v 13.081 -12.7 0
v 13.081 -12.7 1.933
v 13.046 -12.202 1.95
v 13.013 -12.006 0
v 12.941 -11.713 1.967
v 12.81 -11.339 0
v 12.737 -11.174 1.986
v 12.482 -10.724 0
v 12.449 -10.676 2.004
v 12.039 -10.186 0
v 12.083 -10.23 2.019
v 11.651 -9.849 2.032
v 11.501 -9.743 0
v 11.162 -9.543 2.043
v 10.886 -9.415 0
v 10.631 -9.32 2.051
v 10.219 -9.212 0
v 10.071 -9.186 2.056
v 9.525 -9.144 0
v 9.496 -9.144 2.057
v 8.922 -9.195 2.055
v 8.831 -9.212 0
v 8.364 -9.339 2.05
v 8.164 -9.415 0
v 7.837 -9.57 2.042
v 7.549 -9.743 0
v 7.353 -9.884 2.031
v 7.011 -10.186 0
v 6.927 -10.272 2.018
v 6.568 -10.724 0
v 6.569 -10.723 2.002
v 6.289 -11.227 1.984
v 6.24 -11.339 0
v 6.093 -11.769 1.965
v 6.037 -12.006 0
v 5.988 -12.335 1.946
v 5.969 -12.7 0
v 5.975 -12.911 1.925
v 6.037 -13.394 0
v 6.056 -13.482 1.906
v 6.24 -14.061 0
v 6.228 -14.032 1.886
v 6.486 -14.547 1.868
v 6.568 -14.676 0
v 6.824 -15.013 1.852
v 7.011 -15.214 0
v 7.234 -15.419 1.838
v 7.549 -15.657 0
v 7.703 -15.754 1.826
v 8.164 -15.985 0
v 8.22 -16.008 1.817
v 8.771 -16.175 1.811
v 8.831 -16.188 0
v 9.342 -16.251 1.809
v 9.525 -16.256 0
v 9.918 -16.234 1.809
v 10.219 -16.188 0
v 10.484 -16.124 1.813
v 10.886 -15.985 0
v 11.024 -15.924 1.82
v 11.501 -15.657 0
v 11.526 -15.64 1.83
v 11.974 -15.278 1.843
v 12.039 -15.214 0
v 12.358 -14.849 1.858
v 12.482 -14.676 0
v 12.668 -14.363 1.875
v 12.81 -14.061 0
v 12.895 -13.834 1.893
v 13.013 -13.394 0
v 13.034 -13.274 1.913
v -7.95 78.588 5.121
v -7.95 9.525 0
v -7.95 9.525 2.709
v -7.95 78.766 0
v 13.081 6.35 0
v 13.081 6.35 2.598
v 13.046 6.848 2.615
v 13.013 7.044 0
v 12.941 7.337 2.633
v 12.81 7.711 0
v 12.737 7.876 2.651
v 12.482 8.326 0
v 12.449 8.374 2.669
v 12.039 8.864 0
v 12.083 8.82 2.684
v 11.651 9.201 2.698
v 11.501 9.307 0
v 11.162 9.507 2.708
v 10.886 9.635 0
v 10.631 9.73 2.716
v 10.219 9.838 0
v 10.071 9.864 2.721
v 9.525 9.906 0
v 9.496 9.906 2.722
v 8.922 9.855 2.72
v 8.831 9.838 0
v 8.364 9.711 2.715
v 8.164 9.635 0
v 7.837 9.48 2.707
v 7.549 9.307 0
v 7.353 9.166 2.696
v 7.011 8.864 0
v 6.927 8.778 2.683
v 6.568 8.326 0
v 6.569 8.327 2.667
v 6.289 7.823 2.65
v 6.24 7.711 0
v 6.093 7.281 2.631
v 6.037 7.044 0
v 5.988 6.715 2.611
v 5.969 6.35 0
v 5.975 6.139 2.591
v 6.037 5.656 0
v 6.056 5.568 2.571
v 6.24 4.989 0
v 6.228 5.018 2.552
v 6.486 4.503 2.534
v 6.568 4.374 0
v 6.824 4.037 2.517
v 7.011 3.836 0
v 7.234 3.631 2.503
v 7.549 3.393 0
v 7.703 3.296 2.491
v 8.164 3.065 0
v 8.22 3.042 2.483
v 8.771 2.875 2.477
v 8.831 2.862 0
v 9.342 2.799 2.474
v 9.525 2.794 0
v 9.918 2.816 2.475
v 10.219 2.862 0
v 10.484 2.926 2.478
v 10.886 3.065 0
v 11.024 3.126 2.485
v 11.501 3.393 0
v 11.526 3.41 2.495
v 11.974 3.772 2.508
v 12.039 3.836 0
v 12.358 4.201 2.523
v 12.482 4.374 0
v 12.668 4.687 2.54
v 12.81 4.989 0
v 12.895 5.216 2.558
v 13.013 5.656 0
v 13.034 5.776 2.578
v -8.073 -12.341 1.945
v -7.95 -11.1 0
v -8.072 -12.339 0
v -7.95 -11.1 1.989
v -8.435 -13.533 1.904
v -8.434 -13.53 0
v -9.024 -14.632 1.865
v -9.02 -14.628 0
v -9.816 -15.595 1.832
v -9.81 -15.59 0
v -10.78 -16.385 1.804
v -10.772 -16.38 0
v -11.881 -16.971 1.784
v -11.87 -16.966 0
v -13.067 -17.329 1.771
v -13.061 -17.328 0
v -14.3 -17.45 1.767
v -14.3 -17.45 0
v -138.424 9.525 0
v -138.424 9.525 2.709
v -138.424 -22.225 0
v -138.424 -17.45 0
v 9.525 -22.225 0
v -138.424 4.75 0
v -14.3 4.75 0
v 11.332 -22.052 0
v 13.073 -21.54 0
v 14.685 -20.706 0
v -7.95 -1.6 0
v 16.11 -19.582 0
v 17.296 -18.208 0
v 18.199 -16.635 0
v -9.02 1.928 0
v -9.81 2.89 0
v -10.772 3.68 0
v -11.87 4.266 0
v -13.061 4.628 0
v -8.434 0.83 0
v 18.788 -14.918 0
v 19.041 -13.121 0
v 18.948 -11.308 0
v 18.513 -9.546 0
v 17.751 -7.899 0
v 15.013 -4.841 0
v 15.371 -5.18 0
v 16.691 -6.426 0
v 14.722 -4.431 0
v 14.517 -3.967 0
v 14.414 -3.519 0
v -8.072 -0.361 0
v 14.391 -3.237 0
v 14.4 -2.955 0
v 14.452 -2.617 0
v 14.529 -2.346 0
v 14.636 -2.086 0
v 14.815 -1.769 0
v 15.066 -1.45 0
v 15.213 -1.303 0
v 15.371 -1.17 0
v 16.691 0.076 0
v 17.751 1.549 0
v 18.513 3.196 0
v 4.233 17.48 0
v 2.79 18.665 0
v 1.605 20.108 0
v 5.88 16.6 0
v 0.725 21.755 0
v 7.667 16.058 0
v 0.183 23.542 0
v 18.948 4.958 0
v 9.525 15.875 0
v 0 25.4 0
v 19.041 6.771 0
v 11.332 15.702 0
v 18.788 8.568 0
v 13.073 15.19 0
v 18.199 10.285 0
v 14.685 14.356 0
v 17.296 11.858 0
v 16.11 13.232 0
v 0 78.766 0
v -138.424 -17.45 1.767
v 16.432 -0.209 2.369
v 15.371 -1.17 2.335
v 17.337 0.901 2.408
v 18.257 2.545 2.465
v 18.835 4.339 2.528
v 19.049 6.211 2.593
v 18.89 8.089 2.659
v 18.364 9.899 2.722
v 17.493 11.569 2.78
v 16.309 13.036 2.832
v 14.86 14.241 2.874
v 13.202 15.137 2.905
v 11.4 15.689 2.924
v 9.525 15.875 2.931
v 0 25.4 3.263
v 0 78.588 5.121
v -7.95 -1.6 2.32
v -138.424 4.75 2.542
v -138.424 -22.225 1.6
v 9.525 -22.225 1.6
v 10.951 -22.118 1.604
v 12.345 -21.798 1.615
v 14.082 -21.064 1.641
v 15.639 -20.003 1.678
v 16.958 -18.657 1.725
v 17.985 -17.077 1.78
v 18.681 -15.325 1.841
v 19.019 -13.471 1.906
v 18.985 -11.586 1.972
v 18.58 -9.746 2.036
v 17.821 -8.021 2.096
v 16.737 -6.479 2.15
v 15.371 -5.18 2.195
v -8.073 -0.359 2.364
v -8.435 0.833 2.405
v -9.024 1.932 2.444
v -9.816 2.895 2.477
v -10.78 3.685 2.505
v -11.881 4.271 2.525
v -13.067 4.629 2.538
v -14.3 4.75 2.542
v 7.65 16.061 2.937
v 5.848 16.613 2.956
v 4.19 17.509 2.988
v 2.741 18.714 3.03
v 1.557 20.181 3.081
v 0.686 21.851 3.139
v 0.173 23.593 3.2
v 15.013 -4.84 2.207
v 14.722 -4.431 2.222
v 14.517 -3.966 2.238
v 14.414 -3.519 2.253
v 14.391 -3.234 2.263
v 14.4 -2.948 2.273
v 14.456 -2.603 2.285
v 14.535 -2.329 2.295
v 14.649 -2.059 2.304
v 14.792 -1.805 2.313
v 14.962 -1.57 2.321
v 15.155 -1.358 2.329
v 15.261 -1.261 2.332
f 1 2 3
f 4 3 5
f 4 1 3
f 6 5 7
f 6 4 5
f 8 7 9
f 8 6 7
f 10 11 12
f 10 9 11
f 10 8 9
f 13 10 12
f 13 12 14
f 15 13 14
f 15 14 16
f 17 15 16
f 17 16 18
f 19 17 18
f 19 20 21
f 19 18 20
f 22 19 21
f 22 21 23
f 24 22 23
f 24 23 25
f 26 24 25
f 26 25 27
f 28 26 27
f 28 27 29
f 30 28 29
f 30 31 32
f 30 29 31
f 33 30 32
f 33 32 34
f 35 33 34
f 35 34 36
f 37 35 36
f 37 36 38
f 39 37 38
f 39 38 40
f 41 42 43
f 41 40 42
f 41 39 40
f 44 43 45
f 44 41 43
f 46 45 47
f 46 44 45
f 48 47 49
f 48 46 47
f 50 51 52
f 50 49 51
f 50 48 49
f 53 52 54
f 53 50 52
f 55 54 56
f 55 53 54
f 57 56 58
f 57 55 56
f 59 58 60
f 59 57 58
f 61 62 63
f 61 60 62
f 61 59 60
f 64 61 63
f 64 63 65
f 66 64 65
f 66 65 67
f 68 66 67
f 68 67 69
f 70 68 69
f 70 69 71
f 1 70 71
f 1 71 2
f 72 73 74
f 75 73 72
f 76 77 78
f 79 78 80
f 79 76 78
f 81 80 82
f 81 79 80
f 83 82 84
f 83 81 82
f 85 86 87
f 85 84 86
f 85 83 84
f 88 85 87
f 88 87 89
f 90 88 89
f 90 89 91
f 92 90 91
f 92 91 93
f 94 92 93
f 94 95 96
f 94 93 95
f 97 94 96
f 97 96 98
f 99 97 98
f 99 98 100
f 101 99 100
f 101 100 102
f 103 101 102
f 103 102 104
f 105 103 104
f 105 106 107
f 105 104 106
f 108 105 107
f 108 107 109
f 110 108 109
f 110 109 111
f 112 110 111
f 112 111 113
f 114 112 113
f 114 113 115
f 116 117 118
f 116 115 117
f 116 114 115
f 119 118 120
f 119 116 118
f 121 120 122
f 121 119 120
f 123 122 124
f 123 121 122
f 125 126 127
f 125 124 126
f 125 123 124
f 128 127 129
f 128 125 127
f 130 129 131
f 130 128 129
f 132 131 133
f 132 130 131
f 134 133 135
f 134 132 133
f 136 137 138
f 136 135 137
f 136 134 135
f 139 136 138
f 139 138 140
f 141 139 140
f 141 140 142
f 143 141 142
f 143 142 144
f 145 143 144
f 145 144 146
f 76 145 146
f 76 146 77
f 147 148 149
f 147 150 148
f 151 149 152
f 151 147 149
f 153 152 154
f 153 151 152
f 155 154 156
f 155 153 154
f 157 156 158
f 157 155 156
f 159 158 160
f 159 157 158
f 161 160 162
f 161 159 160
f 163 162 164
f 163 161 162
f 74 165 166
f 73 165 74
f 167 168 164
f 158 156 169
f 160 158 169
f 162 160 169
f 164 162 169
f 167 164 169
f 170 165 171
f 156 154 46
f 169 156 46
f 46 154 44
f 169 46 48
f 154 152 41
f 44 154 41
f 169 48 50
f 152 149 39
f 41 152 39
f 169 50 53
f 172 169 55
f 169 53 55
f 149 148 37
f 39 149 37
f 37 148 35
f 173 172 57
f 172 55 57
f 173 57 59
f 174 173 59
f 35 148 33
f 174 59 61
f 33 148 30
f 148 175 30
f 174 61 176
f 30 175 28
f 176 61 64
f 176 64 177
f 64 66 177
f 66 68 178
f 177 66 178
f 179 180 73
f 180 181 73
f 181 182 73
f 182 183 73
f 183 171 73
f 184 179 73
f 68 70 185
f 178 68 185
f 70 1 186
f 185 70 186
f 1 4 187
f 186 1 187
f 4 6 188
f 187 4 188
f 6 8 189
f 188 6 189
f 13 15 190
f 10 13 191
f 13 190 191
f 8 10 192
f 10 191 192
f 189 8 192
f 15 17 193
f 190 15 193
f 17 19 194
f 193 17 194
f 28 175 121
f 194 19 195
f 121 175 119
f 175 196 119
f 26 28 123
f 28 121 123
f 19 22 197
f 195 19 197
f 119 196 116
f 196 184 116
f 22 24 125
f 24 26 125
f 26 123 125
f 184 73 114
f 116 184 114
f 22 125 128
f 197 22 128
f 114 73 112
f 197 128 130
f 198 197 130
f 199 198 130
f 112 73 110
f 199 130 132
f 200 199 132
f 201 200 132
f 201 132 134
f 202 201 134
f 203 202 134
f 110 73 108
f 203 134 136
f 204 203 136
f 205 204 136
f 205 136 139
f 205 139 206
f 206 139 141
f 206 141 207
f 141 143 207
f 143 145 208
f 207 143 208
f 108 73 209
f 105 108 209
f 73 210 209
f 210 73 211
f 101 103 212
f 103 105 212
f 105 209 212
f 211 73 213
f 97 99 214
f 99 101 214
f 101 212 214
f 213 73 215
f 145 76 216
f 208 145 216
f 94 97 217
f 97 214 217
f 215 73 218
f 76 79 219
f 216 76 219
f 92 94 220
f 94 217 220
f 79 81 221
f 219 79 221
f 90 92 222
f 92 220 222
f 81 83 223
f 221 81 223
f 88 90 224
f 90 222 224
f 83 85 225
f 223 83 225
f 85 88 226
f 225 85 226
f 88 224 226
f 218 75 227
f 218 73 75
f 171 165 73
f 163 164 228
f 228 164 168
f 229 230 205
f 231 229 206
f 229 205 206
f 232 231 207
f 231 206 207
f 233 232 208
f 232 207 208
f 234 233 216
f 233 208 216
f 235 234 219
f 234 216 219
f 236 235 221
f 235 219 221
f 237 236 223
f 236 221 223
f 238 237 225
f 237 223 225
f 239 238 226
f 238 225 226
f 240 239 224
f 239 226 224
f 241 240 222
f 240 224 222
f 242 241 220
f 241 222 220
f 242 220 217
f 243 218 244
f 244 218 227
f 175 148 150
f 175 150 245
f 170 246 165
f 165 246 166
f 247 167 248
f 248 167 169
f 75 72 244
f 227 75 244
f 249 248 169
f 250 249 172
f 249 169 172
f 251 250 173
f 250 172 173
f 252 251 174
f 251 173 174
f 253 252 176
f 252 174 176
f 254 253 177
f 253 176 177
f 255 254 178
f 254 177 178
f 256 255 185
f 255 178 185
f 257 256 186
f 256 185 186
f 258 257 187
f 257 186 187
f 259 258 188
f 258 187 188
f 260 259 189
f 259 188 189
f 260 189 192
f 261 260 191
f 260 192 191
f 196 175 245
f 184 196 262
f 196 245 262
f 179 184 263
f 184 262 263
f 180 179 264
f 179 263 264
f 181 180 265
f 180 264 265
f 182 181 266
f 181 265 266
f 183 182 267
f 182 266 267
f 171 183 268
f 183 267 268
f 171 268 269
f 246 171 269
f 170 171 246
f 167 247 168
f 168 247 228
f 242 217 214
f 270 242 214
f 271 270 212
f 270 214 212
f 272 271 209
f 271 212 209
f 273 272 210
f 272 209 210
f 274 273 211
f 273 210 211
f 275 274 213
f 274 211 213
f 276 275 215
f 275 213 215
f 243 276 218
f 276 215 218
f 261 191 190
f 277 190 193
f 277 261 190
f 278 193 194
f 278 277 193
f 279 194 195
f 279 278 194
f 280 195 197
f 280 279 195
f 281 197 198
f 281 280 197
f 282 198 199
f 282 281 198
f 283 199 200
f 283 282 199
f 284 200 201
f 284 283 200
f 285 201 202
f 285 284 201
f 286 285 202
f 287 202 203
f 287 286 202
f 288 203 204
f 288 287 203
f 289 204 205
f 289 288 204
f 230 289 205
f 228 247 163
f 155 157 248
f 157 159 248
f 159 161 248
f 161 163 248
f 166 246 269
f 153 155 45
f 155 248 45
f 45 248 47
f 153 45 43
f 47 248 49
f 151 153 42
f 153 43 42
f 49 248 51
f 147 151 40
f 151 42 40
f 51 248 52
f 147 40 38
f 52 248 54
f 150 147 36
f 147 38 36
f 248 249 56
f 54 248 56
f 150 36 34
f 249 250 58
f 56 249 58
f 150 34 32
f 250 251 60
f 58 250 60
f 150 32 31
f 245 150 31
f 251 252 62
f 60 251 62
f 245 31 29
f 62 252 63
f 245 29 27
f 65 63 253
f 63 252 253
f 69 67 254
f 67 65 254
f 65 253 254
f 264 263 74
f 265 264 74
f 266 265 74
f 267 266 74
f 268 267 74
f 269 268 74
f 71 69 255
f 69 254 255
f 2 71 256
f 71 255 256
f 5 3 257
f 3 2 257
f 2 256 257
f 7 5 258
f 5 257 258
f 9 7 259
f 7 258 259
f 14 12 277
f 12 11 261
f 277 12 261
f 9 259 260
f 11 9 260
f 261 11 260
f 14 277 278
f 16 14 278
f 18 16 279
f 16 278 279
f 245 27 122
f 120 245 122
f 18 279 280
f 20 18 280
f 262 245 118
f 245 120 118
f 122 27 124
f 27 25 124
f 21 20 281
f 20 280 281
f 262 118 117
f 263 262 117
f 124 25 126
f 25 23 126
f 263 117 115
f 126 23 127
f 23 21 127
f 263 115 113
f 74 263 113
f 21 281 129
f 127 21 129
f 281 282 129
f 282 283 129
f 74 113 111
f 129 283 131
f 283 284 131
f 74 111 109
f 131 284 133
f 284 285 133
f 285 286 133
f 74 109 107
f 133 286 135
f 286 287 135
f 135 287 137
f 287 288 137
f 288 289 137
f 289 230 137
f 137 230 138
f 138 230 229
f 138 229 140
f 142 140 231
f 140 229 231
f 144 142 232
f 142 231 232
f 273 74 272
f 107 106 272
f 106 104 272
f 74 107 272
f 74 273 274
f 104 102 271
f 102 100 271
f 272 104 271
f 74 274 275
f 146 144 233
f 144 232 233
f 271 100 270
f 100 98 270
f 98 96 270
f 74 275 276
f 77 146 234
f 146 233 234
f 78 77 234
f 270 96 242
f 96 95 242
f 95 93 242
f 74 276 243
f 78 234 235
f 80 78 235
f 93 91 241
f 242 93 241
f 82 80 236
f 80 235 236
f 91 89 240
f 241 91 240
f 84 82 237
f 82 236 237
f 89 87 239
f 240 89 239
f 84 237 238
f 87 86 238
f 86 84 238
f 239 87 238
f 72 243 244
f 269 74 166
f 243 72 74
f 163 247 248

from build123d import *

# Parameters (mm, degrees)
BOSS_EXTRUDE1_OUTLINE_R = 3.556
BOSS_EXTRUDE1_OUTLINE_W = 260.9469
BOSS_EXTRUDE1_OUTLINE_H = 138.1252
BOSS_EXTRUDE1_DEPTH     = 76.2
CUT_EXTRUDE1_DEPTH      = 355.32482824
CUT_EXTRUDE1_DEPTH_BACK = 355.32482824
FILLET1_R               = 2.54
SKETCH7_W               = 260.9469
SKETCH7_H               = 22.1996
CUT_EXTRUDE2_DEPTH      = 347.152897849
FILLET2_R               = 6.35
SKETCH8_W               = 190.775627824
SKETCH8_H               = 235.521960295
CUT_EXTRUDE4_DEPTH      = 347.144751077
SKETCH9_W               = 166.035784577
SKETCH9_H               = 113.418104201
CUT_EXTRUDE5_DEPTH      = 227.747805823


# Read off the part's stored shape, not the designer's step: Boss-Extrude1
with BuildPart() as part:
    # Boss-Extrude1 outline → Boss-Extrude1 (new body)
    with BuildSketch(Plane.XY):
        with BuildLine():
            Line((-286.3596, -22.225), (9.525, -22.225))
            ThreePointArc((9.525, -22.225), (19.05, -12.7), (9.525, -3.175))
            ThreePointArc((9.525, -3.175), (19.05, 6.35), (9.525, 15.875))
            ThreePointArc((9.525, 15.875), (2.789807909, 18.664807909), (0, 25.4))
            Line((0, 25.4), (0, 131.7752))
            ThreePointArc((0, 131.7752), (2.789807909, 138.510392091), (9.525, 141.3002))
            ThreePointArc((9.525, 141.3002), (19.05, 150.8252), (9.525, 160.3502))
            ThreePointArc((9.525, 160.3502), (19.05, 169.8752), (9.525, 179.4002))
            Line((9.525, 179.4002), (-6.35, 179.4002))
            Line((-6.35, 179.4002), (-6.35, 163.5252))
            Line((-6.35, 163.5252), (-7.9502, 163.5252))
            Line((-7.9502, 163.5252), (-7.9502, 160.3502))
            Line((-7.9502, 160.3502), (-268.9098, 160.3502))
            Line((-268.9098, 160.3502), (-268.9098, 163.5252))
            Line((-268.9098, 163.5252), (-270.51, 163.5252))
            Line((-270.51, 163.5252), (-270.51, 179.4002))
            Line((-270.51, 179.4002), (-286.385, 179.4002))
            ThreePointArc((-286.385, 179.4002), (-295.91, 169.8752), (-286.385, 160.3502))
            ThreePointArc((-286.385, 160.3502), (-295.897297883, 150.818850004), (-286.3723, 141.3002))
            ThreePointArc((-286.3723, 141.3002), (-279.637107909, 138.510392091), (-276.8473, 131.7752))
            Line((-276.8473, 131.7752), (-276.8473, 25.4))
            ThreePointArc((-276.8473, 25.4), (-279.637107909, 18.664807909), (-286.3723, 15.875))
            ThreePointArc((-286.3723, 15.875), (-295.8973, 6.35), (-286.3723, -3.175))
            ThreePointArc((-286.3723, -3.175), (-295.884597883, -12.706349996), (-286.3596, -22.225))
        make_face()
        with Locations((-286.3596, -12.7)):
            Circle(BOSS_EXTRUDE1_OUTLINE_R, mode=Mode.SUBTRACT)
        with Locations((-286.3723, 6.35)):
            Circle(BOSS_EXTRUDE1_OUTLINE_R, mode=Mode.SUBTRACT)
        with Locations((9.525, -12.7)):
            Circle(BOSS_EXTRUDE1_OUTLINE_R, mode=Mode.SUBTRACT)
        with Locations((9.525, 6.35)):
            Circle(BOSS_EXTRUDE1_OUTLINE_R, mode=Mode.SUBTRACT)
        with Locations((-286.3723, 150.8252)):
            Circle(BOSS_EXTRUDE1_OUTLINE_R, mode=Mode.SUBTRACT)
        with Locations((-286.385, 169.8752)):
            Circle(BOSS_EXTRUDE1_OUTLINE_R, mode=Mode.SUBTRACT)
        with Locations((-138.42365, 78.5876)):
            Rectangle(BOSS_EXTRUDE1_OUTLINE_W, BOSS_EXTRUDE1_OUTLINE_H, mode=Mode.SUBTRACT)
        with Locations((9.525, 150.8252)):
            Circle(BOSS_EXTRUDE1_OUTLINE_R, mode=Mode.SUBTRACT)
        with Locations((9.525, 169.8752)):
            Circle(BOSS_EXTRUDE1_OUTLINE_R, mode=Mode.SUBTRACT)
    extrude(amount=BOSS_EXTRUDE1_DEPTH)

    # Sketch5 → Cut-Extrude1 (cut, two sides: drawn at the far end of the back side and taken through both)
    with BuildSketch(Plane.ZY.offset(276.8473).offset(-CUT_EXTRUDE1_DEPTH_BACK)):
        Polygon((1.6002, -22.225), (8.641107133, 179.4002), (76.2, 179.4002), (76.2, -22.225), align=None)
    extrude(amount=CUT_EXTRUDE1_DEPTH + CUT_EXTRUDE1_DEPTH_BACK, mode=Mode.SUBTRACT)

    # Fillet1
    fillet1_edges = [part.edges().sort_by_distance(p)[0] for p in [
        (-286.385, 160.3502, 3.987933237),
        (-286.3723, -3.175, 1.132720329),
        (9.525, -3.175, 1.132720329),
        (9.525, 160.3502, 3.987933237),
    ]]
    fillet(fillet1_edges, radius=FILLET1_R)

    # Sketch7 → Cut-Extrude2 (cut, through all)
    with BuildSketch(Plane(origin=(0, 0, 0), x_dir=(-1, 0, 0), z_dir=(0, 0, -1))):
        with Locations((138.42365, -6.35)):
            Rectangle(SKETCH7_W, SKETCH7_H)
    extrude(amount=-CUT_EXTRUDE2_DEPTH, mode=Mode.SUBTRACT)

    # Fillet2
    fillet2_edges = [part.edges().sort_by_distance(p)[0] for p in [
        (-268.8971, 4.7498, 1.271090386),
        (-268.8971, -17.4498, 0.883476829),
        (-7.9502, -17.4498, 0.883476829),
        (-7.9502, 4.7498, 1.271090386),
    ]]
    fillet(fillet2_edges, radius=FILLET2_R)

    # Sketch8 → Cut-Extrude4 (cut, through all)
    with BuildSketch(Plane(origin=(0, -0.082881646, 2.373419811), x_dir=(1, 0, 0), z_dir=(0, -0.03489949670250444, 0.9993908270190958))):
        with Locations((-233.811463912, 74.917246318)):
            Rectangle(SKETCH8_W, SKETCH8_H)
    extrude(amount=-CUT_EXTRUDE4_DEPTH, mode=Mode.SUBTRACT)

    # Sketch9 → Cut-Extrude5 (cut, through all)
    with BuildSketch(Plane(origin=(0, -0.082881646, 2.373419811), x_dir=(1, 0, 0), z_dir=(0, -0.03489949670250444, 0.9993908270190958))):
        with Locations((-55.405757712, 135.427486891)):
            Rectangle(SKETCH9_W, SKETCH9_H)
    extrude(amount=-CUT_EXTRUDE5_DEPTH, mode=Mode.SUBTRACT)


solid = part.part
